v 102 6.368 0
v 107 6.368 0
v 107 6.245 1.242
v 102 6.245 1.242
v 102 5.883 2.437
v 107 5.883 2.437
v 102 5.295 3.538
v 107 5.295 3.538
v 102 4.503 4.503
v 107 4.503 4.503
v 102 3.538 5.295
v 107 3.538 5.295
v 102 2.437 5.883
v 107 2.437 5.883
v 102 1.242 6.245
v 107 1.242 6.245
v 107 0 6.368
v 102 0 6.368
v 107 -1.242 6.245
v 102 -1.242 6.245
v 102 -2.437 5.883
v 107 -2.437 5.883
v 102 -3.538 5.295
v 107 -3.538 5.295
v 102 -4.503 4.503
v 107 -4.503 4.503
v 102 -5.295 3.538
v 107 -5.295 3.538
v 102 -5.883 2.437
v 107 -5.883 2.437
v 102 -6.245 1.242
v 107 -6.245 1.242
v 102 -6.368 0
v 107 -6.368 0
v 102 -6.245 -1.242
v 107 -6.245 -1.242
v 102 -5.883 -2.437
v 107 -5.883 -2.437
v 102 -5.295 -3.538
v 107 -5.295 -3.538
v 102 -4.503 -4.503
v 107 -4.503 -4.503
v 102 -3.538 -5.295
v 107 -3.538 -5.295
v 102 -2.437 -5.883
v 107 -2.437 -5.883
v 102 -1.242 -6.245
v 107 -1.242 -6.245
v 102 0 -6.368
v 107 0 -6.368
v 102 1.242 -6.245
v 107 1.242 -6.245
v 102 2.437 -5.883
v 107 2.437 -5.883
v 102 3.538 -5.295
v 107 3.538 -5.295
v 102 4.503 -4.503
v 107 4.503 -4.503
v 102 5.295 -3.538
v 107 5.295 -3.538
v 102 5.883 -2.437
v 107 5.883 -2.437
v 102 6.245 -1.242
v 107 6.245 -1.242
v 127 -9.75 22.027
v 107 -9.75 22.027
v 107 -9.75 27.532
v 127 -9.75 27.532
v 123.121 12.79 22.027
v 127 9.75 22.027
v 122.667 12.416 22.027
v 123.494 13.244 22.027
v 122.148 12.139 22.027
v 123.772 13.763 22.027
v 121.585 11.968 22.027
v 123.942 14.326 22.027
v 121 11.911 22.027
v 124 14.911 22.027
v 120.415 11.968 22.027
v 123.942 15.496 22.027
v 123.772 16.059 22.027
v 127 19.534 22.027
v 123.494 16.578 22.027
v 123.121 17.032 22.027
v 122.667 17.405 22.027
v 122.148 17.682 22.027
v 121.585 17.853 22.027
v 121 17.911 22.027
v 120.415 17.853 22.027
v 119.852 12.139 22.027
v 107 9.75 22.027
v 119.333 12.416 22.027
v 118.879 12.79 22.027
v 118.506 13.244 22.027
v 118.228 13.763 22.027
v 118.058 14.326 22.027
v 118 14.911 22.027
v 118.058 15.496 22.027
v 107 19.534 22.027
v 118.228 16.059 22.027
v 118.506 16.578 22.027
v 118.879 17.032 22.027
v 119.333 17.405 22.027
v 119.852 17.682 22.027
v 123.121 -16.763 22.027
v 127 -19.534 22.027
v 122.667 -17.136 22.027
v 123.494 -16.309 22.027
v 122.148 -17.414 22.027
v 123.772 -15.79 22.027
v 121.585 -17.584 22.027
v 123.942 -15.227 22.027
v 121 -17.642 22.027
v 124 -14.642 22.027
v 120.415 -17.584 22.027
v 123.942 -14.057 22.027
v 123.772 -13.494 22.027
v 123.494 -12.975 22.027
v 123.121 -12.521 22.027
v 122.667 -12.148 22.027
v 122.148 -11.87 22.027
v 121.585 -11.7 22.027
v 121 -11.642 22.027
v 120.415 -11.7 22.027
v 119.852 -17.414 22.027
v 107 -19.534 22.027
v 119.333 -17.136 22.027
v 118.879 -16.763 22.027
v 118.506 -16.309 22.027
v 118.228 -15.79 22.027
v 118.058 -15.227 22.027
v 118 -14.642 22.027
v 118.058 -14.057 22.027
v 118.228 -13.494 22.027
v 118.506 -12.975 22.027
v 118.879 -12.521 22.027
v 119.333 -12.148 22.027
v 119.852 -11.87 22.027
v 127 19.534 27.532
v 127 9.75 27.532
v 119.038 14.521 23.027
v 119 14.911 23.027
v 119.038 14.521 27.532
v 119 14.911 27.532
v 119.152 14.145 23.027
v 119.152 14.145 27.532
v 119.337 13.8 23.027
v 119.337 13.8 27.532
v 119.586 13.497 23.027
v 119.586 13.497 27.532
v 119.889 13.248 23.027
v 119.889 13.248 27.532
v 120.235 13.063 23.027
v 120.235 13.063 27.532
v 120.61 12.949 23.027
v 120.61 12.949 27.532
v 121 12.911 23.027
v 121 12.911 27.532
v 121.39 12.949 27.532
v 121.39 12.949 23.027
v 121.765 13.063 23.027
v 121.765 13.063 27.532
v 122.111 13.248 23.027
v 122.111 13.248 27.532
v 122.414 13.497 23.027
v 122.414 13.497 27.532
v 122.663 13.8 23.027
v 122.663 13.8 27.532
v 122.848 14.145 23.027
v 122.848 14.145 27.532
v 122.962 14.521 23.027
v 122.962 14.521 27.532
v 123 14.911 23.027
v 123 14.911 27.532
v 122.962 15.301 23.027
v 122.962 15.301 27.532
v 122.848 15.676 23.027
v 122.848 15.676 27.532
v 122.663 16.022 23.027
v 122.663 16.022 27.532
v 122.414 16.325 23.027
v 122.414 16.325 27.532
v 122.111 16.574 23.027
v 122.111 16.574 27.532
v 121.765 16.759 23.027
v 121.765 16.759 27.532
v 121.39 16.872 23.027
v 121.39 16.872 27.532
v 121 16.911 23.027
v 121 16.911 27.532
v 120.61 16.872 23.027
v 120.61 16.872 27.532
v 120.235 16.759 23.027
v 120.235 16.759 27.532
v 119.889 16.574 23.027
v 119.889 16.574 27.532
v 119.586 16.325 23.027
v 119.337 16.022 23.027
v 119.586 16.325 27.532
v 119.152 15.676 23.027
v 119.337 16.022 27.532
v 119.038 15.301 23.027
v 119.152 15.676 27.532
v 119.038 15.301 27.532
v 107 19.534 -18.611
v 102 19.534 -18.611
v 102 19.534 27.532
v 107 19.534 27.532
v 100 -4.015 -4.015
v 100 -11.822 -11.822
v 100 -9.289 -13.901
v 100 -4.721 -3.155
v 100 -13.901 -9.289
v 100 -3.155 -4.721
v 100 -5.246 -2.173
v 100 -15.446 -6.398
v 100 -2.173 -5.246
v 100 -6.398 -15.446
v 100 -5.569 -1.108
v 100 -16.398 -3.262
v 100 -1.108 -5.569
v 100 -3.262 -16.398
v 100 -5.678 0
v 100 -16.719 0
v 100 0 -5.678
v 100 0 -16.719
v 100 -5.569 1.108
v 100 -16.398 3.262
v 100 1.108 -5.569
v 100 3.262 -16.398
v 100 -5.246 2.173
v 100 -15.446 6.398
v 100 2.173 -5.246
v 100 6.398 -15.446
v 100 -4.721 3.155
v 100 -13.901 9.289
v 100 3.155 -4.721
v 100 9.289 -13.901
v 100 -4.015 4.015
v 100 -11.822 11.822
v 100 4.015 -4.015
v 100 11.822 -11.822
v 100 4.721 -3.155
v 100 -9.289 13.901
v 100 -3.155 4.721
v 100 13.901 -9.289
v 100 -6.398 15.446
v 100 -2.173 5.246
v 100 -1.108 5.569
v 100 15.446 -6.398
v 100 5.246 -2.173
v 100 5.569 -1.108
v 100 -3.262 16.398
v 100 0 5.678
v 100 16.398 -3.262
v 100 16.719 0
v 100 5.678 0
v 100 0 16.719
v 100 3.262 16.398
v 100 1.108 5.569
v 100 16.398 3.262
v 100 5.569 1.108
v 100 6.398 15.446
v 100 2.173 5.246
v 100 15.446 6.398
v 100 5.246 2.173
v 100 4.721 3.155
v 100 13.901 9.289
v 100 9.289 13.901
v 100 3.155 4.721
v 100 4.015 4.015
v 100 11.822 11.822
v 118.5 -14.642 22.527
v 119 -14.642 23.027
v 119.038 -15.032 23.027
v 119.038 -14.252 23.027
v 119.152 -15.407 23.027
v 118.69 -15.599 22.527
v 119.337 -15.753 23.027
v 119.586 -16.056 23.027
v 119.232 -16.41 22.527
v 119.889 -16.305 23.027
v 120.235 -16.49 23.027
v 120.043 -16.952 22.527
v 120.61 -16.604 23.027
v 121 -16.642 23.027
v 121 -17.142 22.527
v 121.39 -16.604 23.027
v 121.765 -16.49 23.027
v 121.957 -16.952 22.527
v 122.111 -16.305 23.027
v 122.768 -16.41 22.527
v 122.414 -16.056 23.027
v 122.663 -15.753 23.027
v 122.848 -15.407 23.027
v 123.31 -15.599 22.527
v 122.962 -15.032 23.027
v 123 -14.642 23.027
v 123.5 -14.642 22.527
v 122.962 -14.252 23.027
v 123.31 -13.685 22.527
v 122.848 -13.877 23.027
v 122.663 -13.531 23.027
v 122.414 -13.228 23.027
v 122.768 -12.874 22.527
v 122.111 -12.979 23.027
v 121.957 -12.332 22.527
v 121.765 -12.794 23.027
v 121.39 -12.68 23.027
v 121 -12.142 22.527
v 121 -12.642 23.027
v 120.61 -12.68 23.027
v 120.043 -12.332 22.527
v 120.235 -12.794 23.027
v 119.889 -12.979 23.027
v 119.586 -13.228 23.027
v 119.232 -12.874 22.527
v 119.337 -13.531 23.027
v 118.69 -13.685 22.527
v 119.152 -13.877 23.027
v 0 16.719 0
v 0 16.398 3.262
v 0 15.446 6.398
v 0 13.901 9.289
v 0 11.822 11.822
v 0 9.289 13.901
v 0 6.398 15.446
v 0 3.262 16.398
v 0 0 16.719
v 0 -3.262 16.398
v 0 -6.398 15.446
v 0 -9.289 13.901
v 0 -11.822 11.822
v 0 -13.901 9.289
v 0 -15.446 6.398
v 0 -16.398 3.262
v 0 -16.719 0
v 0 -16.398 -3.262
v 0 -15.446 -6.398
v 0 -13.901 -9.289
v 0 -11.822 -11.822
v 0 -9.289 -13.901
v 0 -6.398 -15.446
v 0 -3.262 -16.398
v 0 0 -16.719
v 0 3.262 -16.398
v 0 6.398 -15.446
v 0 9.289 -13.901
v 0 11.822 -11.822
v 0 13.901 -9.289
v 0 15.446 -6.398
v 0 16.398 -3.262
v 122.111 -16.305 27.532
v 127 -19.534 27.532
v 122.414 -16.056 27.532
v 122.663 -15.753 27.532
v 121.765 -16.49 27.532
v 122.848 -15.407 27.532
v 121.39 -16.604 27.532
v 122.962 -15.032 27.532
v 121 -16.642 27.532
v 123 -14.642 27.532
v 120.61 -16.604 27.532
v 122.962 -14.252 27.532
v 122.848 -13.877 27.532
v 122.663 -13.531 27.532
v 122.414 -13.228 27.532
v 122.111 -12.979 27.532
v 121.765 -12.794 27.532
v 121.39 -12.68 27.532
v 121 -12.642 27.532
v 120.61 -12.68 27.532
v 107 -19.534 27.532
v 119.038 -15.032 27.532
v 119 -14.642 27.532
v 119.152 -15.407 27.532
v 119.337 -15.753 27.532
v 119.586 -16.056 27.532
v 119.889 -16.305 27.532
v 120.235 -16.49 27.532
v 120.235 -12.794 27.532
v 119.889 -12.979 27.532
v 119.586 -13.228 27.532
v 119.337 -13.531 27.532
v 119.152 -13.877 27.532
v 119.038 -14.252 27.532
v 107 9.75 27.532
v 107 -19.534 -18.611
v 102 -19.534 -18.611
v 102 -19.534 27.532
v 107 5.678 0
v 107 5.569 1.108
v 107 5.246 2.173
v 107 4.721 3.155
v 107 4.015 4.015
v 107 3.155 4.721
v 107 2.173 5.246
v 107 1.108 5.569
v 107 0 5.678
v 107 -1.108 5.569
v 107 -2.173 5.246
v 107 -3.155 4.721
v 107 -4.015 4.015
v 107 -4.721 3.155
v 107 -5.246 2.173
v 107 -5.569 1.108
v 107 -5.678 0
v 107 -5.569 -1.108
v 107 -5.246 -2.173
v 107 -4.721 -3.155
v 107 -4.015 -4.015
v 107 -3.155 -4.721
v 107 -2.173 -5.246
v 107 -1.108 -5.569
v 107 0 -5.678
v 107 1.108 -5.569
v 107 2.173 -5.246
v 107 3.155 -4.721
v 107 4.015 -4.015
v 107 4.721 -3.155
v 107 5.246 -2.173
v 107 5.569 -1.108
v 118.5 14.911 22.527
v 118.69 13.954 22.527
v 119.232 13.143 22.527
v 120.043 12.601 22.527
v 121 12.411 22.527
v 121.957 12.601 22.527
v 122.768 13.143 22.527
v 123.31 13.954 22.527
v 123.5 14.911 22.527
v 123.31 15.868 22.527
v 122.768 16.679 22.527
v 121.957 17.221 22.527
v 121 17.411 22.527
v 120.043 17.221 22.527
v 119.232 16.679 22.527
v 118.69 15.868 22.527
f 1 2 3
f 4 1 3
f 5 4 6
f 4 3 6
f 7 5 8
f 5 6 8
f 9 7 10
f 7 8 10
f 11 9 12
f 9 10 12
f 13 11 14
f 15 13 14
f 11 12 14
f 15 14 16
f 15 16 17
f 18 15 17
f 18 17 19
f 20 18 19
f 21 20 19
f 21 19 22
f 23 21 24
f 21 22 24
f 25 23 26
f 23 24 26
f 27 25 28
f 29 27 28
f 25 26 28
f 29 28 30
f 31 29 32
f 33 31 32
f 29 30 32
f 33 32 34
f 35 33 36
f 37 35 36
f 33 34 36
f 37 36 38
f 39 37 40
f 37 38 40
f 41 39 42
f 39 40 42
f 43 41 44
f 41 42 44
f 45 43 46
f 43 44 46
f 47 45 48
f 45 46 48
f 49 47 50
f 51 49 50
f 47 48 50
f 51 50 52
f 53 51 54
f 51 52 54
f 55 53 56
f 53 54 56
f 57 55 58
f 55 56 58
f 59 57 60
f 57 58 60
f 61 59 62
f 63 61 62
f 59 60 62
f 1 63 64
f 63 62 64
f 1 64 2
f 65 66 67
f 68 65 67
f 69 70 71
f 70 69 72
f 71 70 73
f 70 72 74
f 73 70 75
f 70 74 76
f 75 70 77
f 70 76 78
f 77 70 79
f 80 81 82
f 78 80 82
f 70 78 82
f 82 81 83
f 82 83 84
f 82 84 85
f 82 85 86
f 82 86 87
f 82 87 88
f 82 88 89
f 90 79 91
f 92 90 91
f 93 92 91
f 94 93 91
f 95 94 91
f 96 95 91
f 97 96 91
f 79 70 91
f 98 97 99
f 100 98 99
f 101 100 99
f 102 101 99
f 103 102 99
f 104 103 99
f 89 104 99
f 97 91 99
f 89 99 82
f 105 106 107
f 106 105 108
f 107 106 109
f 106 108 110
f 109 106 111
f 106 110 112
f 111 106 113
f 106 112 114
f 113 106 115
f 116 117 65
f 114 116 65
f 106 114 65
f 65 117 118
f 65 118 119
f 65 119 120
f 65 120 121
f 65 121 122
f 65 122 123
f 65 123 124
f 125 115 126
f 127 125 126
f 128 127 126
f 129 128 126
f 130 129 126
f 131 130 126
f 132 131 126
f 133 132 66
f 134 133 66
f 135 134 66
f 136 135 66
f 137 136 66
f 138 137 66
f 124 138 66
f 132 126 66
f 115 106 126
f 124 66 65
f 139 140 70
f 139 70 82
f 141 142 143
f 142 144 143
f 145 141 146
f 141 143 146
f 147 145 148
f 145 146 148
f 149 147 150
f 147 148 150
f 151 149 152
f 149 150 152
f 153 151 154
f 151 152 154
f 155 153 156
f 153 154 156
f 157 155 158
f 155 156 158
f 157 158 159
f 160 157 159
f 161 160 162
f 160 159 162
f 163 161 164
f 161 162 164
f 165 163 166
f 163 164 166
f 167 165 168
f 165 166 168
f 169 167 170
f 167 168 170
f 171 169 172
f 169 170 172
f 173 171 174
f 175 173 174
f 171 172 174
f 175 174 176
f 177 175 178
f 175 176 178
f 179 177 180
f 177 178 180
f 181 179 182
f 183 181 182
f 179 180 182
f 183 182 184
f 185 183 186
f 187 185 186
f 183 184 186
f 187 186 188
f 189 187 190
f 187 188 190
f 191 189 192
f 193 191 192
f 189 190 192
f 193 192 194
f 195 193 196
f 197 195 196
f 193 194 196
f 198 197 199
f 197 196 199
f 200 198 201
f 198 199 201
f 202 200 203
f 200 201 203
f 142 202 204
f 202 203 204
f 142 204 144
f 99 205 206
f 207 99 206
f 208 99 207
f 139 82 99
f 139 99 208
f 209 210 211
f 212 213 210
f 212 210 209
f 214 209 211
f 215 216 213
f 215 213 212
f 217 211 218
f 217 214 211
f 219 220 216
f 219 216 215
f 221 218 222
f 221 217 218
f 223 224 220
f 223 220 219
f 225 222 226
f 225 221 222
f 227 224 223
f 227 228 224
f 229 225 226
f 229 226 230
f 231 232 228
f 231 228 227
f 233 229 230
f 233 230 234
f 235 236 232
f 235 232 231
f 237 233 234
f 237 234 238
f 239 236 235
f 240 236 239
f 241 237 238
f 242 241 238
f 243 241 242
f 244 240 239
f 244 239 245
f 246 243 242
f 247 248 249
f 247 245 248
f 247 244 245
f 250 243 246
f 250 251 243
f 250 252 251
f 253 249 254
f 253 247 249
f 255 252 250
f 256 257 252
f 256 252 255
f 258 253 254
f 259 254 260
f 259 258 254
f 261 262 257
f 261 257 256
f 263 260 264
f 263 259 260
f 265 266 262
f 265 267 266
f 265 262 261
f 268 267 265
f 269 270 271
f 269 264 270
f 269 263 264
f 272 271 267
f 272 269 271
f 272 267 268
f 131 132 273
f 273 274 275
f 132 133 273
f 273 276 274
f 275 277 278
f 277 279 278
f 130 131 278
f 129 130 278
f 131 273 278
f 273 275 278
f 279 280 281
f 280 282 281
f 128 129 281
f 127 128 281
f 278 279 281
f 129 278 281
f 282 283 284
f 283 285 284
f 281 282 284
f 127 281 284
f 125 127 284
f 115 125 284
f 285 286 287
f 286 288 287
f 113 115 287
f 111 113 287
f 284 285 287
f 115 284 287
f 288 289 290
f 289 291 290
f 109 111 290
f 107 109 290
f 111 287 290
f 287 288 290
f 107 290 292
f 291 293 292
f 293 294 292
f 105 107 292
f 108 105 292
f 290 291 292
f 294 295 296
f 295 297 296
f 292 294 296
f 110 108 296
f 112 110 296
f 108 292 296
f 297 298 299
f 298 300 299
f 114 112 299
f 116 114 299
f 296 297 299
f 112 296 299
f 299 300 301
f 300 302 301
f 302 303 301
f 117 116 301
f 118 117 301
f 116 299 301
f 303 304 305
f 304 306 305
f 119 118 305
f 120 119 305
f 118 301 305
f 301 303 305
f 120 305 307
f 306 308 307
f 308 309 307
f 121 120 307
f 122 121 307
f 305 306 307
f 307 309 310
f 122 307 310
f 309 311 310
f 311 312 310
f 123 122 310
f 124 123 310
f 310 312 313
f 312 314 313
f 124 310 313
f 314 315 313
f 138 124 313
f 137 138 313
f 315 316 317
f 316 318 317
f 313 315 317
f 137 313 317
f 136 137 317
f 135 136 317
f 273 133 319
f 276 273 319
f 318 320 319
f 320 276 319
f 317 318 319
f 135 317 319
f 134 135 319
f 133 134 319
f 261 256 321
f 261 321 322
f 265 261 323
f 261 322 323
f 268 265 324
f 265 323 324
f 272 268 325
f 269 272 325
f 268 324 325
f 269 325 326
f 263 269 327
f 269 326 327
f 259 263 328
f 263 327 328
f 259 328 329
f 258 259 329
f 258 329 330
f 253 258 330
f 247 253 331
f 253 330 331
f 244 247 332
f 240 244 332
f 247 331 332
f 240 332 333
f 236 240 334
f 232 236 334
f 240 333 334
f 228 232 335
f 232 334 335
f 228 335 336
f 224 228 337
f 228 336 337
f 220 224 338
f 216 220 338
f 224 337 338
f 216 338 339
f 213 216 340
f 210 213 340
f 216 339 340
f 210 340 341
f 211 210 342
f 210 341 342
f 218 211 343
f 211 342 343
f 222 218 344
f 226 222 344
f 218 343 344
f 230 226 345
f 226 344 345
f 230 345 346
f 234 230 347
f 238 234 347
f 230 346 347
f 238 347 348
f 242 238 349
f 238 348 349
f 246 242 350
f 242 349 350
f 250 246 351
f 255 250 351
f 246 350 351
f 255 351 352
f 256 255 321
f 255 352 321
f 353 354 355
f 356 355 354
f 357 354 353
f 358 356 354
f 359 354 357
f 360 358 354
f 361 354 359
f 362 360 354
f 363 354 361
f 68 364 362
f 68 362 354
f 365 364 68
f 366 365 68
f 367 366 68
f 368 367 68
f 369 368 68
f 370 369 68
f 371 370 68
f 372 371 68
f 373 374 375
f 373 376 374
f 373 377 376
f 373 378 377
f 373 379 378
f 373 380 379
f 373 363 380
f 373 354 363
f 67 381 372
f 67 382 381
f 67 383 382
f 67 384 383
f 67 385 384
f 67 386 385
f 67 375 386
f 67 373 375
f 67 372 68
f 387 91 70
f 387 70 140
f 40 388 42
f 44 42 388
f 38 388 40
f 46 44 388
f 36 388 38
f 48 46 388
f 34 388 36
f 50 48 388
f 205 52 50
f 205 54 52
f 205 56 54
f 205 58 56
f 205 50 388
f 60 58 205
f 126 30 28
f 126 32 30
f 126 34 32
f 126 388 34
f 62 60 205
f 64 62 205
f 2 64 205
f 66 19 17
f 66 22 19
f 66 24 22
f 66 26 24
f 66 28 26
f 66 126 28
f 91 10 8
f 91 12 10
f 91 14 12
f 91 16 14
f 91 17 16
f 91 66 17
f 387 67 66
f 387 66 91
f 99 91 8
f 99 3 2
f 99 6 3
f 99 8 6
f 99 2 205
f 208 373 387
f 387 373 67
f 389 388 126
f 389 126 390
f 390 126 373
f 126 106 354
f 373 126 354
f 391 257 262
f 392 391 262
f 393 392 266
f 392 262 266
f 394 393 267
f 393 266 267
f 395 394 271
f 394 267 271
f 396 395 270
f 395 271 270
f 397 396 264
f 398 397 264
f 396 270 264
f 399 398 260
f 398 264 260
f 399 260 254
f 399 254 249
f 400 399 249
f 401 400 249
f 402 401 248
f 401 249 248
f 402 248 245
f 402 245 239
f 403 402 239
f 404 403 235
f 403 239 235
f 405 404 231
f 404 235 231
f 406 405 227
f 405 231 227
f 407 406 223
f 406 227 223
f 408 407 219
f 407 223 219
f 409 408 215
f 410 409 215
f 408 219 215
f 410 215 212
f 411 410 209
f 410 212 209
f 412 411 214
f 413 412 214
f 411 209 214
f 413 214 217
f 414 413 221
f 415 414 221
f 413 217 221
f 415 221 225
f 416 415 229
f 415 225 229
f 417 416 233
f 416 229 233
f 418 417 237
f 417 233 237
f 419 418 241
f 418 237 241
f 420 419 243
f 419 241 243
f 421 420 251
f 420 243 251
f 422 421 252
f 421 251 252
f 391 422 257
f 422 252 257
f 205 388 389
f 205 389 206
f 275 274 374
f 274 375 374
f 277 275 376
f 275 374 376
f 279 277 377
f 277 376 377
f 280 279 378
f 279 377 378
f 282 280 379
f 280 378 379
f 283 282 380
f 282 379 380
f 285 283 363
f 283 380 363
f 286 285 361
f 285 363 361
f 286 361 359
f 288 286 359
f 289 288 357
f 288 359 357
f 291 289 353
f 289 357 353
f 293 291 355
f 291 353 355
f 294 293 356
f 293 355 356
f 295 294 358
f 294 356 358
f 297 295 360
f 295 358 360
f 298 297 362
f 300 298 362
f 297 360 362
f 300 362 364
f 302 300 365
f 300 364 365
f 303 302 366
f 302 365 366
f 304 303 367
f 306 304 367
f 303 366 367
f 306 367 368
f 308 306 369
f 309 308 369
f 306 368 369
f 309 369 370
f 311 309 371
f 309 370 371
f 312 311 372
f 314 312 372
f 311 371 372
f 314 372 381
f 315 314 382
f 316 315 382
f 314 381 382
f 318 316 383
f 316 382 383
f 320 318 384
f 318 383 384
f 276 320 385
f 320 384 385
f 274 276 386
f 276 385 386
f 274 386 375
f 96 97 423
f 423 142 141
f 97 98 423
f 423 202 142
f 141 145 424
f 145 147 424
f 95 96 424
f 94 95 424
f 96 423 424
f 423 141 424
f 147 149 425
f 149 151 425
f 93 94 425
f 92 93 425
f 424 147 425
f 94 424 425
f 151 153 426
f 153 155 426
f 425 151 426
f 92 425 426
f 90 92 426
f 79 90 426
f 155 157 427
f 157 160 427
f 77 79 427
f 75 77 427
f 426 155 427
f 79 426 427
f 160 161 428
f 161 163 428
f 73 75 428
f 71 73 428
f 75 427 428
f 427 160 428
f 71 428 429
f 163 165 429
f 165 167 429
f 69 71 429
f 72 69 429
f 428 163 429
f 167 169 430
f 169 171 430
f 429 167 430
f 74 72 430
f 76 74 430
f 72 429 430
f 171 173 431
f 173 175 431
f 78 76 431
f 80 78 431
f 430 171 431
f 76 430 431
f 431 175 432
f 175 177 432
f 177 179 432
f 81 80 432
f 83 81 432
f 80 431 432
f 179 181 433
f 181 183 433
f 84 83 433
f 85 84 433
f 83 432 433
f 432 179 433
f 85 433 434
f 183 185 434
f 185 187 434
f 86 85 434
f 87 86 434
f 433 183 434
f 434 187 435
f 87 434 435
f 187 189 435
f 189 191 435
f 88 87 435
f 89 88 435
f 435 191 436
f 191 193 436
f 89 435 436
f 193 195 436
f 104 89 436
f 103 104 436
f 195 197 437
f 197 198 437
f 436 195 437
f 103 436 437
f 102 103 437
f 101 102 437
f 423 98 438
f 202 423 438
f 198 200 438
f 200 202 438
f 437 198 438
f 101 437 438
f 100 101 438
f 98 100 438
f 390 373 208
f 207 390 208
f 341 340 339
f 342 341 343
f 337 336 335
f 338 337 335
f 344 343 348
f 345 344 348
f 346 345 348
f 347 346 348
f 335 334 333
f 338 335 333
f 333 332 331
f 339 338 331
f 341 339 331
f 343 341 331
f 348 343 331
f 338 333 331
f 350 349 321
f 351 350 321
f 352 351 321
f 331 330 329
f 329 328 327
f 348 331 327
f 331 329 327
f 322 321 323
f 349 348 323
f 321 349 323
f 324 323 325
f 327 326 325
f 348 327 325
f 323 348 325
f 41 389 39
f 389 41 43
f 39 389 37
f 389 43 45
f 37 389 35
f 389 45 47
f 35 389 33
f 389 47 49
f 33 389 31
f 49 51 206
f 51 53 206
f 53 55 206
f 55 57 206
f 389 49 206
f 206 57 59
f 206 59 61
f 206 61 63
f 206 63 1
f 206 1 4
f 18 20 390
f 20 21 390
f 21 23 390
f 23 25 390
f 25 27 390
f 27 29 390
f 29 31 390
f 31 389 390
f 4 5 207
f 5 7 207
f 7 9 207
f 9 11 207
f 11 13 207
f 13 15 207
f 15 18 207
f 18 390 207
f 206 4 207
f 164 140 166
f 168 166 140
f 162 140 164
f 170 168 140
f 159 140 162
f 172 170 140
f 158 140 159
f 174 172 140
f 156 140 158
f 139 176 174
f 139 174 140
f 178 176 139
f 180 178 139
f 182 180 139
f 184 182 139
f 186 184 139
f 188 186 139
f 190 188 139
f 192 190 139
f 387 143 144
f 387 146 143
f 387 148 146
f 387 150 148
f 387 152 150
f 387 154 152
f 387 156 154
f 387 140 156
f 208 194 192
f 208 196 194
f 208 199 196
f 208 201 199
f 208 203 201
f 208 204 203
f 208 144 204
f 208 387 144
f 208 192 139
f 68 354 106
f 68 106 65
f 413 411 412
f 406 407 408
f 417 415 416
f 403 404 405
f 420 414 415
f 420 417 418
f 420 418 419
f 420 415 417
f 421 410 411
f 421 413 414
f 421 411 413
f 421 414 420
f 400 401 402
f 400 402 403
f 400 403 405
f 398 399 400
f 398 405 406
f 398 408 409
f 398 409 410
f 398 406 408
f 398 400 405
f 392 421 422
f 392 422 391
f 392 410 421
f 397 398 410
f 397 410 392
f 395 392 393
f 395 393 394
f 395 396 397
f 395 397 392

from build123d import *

# Parameters (mm, degrees)
F0_R            = 16.718896
F1_DEPTH        = 100
F2_R            = 5.678024
F3_DEPTH        = 7
F4_W            = 39.06738
F4_H            = 46.14258
F4_R            = 6.367752
F5_DEPTH        = 5
F6_W            = 9.783276
F6_H            = 5.504621
F7_DEPTH        = 20
F9_D            = 4
F9_CSINK_D      = 6
F9_CSINK_ANGLE  = 90
F10_D           = 4
F10_CSINK_D     = 6
F10_CSINK_ANGLE = 90


with BuildPart() as f1:
    # F0 (on Right) → F1 (new body)
    with BuildSketch(Plane.YZ):
        Circle(F0_R)
    extrude(amount=F1_DEPTH)

    # F2 (on face) → F3 (join)
    with BuildSketch(Plane.YZ.offset(100)):
        Circle(F2_R)
    extrude(amount=F3_DEPTH)


with BuildPart() as f5:
    # F4 (on face) → F5 (new body)
    with BuildSketch(Plane.YZ.offset(107)):
        with Locations((0, 4.460449)):
            Rectangle(F4_W, F4_H)
        Circle(F4_R, mode=Mode.SUBTRACT)
    extrude(amount=-F5_DEPTH)

    # F6 (on face) → F7 (join)
    with BuildSketch(Plane.YZ.offset(107)):
        with Locations((-14.642052, 24.779428)):
            Rectangle(F6_W, F6_H)
        with Locations((14.642052, 24.779428)):
            Rectangle(F6_W, F6_H)
    extrude(amount=F7_DEPTH)

    # F9 (through all)
    with Locations(Plane(origin=(0, 0, 22.027118), x_dir=(1, 0, 0), z_dir=(0, 0, -1))):
        with Locations((121, 14.642052)):
            CounterSinkHole(F9_D / 2, F9_CSINK_D / 2, counter_sink_angle=F9_CSINK_ANGLE)

    # F10 (through all)
    with Locations(Plane(origin=(0, 0, 22.027118), x_dir=(1, 0, 0), z_dir=(0, 0, -1))):
        with Locations((121, -14.910832)):
            CounterSinkHole(F10_D / 2, F10_CSINK_D / 2, counter_sink_angle=F10_CSINK_ANGLE)


solid = Compound([f1.part, f5.part])
